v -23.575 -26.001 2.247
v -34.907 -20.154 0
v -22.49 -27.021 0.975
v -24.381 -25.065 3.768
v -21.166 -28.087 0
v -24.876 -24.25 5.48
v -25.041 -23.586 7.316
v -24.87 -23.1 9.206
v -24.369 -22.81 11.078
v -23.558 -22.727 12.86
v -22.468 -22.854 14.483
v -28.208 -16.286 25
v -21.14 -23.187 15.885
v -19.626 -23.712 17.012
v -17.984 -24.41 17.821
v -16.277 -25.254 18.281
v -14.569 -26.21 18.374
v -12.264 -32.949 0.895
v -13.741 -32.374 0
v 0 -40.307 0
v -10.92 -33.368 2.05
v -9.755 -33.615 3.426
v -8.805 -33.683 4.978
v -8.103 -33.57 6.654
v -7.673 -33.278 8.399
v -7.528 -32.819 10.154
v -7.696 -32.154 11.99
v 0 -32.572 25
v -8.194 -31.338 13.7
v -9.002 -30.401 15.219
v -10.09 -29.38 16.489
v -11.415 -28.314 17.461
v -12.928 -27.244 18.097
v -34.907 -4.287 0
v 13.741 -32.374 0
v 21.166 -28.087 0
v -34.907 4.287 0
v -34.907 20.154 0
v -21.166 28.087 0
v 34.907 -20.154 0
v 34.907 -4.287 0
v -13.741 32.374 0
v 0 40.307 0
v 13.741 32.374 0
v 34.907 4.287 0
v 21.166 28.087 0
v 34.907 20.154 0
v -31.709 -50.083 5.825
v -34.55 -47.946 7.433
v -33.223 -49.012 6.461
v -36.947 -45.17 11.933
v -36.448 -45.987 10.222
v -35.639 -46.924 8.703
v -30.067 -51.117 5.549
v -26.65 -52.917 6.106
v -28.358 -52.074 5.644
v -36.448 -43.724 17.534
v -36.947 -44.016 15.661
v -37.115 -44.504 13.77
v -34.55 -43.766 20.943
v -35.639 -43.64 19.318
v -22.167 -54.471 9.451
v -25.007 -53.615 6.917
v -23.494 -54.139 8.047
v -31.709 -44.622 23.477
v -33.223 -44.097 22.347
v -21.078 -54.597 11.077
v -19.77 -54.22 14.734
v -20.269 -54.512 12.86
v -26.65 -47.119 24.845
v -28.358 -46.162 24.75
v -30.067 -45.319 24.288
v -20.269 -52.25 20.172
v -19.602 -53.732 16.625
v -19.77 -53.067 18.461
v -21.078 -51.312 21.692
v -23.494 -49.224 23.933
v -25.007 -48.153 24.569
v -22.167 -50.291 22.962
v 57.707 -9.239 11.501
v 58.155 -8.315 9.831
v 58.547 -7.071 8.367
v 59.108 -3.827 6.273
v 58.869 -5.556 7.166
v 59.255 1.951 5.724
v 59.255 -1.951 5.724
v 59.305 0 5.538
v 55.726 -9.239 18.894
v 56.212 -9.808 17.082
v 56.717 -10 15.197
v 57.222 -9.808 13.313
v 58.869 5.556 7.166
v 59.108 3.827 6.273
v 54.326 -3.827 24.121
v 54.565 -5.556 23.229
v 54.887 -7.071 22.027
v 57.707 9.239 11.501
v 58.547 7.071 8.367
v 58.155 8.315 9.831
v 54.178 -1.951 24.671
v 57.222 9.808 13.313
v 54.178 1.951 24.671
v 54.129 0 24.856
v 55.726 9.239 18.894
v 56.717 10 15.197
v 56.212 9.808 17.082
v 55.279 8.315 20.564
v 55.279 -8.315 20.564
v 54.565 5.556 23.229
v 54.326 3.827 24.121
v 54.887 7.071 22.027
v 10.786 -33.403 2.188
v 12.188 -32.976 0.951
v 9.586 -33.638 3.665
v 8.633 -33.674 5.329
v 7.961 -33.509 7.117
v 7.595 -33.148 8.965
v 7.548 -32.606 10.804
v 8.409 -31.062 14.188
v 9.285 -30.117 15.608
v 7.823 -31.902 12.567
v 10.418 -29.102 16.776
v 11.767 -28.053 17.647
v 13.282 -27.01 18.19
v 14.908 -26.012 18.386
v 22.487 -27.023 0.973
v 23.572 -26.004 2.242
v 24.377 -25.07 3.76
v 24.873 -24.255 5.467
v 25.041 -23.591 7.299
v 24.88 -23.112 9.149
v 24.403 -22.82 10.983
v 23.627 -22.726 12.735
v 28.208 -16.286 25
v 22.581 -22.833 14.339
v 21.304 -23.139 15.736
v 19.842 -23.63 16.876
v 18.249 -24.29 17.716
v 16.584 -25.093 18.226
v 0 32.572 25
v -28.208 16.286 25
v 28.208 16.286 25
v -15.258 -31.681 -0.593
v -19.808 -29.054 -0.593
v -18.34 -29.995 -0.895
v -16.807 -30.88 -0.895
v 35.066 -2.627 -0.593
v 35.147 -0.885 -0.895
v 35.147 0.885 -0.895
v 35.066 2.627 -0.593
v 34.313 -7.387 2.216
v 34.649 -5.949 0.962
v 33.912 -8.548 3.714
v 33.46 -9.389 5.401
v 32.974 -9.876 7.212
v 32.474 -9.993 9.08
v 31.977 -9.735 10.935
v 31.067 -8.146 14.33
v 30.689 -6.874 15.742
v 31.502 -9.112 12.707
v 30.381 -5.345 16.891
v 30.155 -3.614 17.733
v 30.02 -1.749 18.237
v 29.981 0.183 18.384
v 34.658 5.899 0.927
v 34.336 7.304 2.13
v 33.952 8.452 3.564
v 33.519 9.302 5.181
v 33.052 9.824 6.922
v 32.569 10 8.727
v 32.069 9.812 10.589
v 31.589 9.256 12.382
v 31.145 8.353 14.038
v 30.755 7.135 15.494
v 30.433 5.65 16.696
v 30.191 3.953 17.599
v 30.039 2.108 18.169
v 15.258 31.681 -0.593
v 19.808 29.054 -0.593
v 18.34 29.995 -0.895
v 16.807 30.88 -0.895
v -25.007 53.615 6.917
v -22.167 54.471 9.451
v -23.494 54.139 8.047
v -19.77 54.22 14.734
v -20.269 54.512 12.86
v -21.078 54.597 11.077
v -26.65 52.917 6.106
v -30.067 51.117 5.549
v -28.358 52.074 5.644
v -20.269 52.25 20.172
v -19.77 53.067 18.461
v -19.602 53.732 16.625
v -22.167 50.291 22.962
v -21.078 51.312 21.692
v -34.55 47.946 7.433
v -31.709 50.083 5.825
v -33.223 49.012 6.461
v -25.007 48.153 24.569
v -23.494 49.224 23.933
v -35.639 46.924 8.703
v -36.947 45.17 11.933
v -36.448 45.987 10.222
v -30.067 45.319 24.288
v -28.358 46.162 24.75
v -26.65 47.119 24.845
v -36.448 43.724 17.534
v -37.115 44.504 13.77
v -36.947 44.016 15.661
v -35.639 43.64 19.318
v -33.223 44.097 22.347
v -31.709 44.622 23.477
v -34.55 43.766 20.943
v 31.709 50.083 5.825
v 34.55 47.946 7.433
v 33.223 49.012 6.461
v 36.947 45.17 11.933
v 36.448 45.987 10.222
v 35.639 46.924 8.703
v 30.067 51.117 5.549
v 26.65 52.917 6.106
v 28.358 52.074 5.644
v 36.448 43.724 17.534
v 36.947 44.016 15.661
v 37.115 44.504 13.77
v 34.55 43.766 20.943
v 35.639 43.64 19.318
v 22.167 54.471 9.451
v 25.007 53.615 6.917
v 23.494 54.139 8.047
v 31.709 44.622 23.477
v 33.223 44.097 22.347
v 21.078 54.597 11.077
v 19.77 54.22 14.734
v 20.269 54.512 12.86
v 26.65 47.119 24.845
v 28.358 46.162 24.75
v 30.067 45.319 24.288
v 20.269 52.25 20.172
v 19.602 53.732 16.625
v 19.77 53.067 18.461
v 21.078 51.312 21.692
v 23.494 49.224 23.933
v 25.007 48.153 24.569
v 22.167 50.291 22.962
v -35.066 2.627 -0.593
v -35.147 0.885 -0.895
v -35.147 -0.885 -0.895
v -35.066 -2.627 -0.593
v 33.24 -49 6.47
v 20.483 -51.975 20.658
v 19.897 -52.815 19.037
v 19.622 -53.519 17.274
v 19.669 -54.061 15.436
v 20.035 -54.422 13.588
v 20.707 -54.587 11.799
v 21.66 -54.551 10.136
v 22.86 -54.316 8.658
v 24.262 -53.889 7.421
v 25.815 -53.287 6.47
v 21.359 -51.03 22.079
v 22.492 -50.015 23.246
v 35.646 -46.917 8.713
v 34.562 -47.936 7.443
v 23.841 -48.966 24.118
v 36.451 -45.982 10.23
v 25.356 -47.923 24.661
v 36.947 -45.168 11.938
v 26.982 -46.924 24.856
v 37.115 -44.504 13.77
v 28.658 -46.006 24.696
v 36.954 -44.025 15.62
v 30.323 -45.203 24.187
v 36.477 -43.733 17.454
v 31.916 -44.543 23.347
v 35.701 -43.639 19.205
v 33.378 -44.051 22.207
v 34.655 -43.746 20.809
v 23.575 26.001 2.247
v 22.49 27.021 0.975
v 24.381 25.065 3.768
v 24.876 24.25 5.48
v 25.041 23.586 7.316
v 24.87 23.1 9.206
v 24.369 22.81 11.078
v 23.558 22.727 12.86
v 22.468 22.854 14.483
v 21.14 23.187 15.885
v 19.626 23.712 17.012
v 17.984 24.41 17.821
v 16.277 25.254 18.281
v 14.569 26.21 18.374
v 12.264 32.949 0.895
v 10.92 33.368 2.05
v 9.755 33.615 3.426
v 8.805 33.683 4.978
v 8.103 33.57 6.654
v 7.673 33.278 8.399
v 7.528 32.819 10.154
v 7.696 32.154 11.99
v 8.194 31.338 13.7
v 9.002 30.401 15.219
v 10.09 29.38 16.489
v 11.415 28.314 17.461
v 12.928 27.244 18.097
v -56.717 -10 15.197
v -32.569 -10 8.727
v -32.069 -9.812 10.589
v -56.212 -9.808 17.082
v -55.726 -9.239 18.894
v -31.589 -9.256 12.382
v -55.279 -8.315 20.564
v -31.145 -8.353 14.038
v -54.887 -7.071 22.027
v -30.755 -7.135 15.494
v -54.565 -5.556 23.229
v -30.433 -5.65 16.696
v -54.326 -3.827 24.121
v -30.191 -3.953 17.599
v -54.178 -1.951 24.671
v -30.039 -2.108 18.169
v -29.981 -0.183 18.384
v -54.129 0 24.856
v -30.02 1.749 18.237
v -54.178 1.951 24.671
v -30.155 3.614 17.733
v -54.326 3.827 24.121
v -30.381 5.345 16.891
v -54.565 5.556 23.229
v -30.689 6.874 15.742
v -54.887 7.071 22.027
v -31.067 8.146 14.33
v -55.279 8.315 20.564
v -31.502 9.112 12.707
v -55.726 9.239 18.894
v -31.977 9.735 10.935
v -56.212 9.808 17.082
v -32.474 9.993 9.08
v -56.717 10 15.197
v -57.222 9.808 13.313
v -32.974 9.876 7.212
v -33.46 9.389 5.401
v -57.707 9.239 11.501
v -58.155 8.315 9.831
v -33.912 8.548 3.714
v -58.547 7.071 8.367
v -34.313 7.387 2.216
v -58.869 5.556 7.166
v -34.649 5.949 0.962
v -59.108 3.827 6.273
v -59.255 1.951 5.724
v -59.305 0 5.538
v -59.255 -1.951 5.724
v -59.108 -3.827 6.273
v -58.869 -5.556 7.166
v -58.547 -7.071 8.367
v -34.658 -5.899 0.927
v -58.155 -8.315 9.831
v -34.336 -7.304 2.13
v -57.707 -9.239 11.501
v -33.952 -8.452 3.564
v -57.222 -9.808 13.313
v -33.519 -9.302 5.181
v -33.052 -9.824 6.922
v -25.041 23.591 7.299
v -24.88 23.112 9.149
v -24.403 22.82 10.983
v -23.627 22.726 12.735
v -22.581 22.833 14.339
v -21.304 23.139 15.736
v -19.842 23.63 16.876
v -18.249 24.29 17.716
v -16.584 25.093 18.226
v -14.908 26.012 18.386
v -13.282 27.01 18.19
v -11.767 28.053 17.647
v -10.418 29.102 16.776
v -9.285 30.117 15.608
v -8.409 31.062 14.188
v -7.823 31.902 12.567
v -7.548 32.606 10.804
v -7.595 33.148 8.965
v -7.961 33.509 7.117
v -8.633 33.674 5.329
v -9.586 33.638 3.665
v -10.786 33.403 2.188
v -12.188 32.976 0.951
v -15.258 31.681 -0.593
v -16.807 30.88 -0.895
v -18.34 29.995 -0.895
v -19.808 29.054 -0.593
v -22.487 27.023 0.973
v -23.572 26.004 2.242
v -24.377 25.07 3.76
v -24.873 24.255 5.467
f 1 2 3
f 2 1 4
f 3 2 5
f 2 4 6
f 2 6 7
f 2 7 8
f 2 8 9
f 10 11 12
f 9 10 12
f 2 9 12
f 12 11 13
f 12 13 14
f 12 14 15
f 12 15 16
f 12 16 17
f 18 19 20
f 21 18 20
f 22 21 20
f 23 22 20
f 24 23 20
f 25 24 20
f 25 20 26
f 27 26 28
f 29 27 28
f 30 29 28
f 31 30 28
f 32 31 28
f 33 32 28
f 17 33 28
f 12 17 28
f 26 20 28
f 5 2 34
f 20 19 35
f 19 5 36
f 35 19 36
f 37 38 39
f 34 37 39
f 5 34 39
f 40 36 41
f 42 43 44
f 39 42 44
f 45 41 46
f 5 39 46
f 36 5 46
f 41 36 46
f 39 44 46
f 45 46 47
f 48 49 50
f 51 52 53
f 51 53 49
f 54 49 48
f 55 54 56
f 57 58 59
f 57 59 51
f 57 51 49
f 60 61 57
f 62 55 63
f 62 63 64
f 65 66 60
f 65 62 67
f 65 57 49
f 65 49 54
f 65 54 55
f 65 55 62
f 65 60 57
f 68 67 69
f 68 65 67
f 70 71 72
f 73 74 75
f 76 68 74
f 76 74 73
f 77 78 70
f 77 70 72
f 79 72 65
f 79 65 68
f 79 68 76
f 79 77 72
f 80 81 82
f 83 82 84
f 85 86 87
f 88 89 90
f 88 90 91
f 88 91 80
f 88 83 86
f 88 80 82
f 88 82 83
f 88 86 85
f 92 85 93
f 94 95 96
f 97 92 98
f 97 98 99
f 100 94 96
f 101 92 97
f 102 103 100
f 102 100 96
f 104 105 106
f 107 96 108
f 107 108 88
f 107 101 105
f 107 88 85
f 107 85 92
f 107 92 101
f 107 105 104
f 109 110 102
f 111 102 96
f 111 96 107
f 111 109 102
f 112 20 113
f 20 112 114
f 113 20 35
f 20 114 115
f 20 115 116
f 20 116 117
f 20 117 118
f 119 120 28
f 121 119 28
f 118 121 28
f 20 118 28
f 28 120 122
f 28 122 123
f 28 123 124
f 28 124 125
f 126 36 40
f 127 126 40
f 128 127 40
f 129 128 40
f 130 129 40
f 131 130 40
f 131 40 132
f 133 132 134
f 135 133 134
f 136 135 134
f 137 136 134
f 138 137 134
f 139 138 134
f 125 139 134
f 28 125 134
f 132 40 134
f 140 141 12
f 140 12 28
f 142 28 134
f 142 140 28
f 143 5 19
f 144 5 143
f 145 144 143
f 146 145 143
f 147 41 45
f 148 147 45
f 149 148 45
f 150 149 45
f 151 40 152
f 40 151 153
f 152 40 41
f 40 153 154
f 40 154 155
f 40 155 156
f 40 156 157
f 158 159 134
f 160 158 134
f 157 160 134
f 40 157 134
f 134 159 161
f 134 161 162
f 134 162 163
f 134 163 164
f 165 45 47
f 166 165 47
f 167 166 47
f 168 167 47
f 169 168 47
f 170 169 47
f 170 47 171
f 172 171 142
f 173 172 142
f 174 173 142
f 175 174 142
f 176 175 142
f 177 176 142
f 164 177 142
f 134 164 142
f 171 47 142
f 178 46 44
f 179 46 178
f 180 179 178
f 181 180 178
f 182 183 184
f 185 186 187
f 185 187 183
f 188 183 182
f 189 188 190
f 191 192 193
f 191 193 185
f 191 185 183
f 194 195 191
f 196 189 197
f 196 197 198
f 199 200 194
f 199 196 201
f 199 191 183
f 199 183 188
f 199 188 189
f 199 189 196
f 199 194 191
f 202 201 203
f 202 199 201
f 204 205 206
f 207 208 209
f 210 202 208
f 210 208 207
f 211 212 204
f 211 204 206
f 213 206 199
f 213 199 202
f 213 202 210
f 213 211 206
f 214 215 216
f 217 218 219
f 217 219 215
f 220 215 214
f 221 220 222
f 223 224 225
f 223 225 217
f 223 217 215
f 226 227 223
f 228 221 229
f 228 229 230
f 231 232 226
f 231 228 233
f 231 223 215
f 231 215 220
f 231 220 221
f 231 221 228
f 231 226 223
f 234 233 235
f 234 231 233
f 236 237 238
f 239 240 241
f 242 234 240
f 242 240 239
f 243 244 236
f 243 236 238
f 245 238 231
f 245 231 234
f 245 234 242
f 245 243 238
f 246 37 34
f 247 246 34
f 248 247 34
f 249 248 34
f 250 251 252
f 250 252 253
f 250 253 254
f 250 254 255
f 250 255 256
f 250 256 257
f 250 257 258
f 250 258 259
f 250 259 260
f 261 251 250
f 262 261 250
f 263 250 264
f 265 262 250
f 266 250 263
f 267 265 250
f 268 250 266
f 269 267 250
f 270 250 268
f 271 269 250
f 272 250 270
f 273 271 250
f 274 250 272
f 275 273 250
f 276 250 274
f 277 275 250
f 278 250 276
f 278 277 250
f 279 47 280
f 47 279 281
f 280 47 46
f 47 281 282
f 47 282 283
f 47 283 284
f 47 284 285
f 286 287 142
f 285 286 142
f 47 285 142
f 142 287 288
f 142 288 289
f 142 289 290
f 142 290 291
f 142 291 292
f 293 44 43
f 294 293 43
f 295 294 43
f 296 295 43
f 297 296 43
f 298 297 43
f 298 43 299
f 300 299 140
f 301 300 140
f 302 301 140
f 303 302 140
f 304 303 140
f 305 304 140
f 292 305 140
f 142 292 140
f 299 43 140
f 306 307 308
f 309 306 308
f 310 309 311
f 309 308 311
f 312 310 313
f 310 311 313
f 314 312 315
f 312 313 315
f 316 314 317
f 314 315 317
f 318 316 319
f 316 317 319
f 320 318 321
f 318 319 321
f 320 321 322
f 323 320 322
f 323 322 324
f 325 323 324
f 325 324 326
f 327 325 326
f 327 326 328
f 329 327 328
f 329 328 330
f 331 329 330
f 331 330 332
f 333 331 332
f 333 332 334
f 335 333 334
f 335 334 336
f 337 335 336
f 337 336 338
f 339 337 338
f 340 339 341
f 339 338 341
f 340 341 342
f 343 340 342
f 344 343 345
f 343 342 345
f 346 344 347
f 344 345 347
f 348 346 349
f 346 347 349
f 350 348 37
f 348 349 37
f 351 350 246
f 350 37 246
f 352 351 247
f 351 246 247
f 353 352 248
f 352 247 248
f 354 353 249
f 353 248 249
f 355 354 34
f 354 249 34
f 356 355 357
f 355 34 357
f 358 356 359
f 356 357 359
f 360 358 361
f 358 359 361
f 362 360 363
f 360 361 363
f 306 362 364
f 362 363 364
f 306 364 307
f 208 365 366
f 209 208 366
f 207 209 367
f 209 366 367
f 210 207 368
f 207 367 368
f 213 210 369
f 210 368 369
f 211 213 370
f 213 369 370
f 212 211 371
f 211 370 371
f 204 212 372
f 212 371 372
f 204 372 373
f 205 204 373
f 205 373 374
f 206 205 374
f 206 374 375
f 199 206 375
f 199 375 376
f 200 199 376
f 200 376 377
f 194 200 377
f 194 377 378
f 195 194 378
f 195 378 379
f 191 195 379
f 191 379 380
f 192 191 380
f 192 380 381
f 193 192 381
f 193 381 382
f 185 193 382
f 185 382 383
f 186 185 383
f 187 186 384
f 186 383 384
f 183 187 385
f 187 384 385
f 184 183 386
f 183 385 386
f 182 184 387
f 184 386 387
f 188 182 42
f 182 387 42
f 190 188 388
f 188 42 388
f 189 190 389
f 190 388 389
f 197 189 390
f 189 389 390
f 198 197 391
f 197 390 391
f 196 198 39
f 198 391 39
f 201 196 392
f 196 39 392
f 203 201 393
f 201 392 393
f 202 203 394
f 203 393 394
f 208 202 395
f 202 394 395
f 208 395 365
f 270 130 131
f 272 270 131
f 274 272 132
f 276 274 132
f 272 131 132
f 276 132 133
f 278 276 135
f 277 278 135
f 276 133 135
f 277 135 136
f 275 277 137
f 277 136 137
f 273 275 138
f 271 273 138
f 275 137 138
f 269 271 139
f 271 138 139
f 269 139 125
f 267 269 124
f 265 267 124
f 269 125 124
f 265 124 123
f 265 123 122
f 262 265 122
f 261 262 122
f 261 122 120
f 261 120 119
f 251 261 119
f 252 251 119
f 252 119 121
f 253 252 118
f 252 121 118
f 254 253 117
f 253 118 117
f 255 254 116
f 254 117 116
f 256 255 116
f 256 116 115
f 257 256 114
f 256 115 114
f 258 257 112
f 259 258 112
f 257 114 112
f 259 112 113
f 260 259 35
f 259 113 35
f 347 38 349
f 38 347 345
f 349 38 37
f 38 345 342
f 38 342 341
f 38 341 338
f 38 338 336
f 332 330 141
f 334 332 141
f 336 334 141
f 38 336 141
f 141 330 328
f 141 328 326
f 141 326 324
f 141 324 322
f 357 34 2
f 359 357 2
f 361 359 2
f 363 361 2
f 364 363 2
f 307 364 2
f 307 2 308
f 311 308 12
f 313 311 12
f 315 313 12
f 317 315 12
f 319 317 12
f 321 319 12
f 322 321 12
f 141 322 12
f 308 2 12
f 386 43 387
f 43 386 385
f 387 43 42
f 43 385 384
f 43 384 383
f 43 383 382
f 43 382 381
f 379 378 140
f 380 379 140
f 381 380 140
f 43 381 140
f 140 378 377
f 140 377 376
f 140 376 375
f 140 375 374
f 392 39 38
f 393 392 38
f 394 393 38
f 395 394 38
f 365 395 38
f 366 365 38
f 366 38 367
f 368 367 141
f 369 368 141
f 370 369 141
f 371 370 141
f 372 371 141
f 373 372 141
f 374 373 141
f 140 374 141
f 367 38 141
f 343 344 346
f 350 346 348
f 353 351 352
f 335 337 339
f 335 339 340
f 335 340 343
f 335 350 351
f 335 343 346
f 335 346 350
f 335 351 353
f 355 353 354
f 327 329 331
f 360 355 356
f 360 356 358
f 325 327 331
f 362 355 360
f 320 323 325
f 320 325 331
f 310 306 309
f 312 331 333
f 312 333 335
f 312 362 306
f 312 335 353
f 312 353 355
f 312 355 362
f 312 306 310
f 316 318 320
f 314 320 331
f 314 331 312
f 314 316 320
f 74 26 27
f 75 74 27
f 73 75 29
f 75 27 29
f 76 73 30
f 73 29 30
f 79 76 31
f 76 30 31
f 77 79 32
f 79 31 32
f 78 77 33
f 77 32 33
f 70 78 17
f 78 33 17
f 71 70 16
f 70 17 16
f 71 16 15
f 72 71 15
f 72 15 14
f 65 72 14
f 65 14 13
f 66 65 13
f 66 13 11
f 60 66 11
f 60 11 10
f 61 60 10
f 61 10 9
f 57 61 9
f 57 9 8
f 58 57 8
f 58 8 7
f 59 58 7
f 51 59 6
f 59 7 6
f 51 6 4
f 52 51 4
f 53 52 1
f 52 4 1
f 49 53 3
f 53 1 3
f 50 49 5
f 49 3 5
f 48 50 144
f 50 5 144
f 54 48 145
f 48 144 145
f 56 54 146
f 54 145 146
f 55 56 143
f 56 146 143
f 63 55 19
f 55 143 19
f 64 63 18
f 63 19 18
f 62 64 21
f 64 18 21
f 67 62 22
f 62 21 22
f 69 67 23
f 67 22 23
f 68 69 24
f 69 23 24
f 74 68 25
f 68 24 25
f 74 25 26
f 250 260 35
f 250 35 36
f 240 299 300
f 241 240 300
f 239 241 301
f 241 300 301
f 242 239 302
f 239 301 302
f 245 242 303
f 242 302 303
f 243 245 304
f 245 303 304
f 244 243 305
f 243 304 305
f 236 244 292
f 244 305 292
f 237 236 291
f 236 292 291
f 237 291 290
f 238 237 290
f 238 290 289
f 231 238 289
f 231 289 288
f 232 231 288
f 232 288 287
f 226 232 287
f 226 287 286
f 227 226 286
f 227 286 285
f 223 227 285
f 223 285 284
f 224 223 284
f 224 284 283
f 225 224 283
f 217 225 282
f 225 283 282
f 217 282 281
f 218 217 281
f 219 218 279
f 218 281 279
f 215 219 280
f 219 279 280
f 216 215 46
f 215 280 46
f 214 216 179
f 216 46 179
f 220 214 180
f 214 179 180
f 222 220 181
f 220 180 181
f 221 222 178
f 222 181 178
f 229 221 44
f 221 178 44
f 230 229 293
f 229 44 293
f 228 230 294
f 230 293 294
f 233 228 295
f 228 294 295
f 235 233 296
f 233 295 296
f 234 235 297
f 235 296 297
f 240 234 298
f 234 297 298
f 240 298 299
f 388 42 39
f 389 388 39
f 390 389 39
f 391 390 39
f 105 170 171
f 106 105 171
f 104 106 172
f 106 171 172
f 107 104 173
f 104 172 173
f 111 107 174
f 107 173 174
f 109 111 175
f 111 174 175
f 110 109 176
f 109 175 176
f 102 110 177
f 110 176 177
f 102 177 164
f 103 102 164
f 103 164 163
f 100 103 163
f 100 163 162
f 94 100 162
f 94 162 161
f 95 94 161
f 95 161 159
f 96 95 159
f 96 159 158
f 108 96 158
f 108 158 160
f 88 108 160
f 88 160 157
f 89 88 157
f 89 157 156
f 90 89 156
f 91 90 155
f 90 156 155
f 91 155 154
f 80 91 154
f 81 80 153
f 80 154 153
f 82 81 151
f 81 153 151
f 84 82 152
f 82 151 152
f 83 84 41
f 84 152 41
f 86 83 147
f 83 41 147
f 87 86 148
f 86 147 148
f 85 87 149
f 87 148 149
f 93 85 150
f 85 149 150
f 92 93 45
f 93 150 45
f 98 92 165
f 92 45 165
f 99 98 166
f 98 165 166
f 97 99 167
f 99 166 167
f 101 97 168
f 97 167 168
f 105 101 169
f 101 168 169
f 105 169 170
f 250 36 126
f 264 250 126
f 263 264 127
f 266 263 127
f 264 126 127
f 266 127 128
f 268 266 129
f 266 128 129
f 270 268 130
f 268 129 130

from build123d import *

# Parameters (mm, degrees)
F1_DEPTH  = 25
F1_TAPER  = 15
F2_R      = 10
F3_DEPTH  = 25
F8_DEPTH  = 25
F9_R      = 10
F10_DEPTH = 25
F11_R     = 10
F12_DEPTH = 25
F13_R     = 10
F5_DEPTH  = 25
F6_R      = 10
F7_DEPTH  = 25


with BuildPart() as f1:
    # F0 (on Top) → F1 (new body)
    with BuildSketch(Plane.XY):
        Polygon((-34.9069200456, 20.1535196849), (-34.9069200456, -20.1535196849), (0, -40.3070393698), (34.9069200456, -20.1535196849), (34.9069200456, 20.1535196849), (0, 40.3070393698), align=None)
    extrude(amount=F1_DEPTH, taper=F1_TAPER)

    # F2 (on face) → F3 (join)
    with BuildSketch(Plane(origin=(-16.2842998932, -28.2052347808, 8.7267300114), x_dir=(0.8756408079, -0.4613836487, 0.1427525977), z_dir=(-0.4829629131, -0.8365163037, 0.2588190451))):
        Circle(F2_R)
    extrude(amount=F3_DEPTH)

    # F4 (on face) → F8 (join)
    with BuildSketch(Plane(origin=(16.2842998932, -28.2052347808, 8.7267300114), x_dir=(0.8756408079, 0.4613836487, -0.1427525977), z_dir=(0.4829629131, -0.8365163037, 0.2588190451))):
        with BuildLine():
            ThreePointArc((5.5749073304, -8.3018316206), (8.8246550444, -4.7037711836), (10, 0))
            ThreePointArc((10, 0), (-5.9563004457, 8.0325889351), (-2.9044970001, -9.5689026109))
            Line((-2.9044970001, -9.5689026109), (5.5749073304, -8.3018316206))
        make_face()
    extrude(amount=F8_DEPTH)

    # F9 (on face) → F10 (join)
    with BuildSketch(Plane(origin=(32.5685997865, 0, 8.7267300114), x_dir=(0, 1, 0), z_dir=(0.9659258263, 0, 0.2588190451))):
        Circle(F9_R)
    extrude(amount=F10_DEPTH)

    # F11 (on face) → F12 (join)
    with BuildSketch(Plane(origin=(16.2842998932, 28.2052347808, 8.7267300114), x_dir=(-0.8756408079, 0.4613836487, 0.1427525977), z_dir=(0.4829629131, 0.8365163037, 0.2588190451))):
        Circle(F11_R)
    extrude(amount=F12_DEPTH)

    # F13 (on face) → F5 (join)
    with BuildSketch(Plane(origin=(-16.2842998932, 28.2052347808, 8.7267300114), x_dir=(-0.8756408079, -0.4613836487, -0.1427525977), z_dir=(-0.4829629131, 0.8365163037, 0.2588190451))):
        Circle(F13_R)
    extrude(amount=F5_DEPTH)

    # F6 (on face) → F7 (join)
    with BuildSketch(Plane(origin=(-32.5685997865, 0, 8.7267300114), x_dir=(0, -1, 0), z_dir=(-0.9659258263, 0, 0.2588190451))):
        Circle(F6_R)
    extrude(amount=F7_DEPTH)


solid = f1.part
